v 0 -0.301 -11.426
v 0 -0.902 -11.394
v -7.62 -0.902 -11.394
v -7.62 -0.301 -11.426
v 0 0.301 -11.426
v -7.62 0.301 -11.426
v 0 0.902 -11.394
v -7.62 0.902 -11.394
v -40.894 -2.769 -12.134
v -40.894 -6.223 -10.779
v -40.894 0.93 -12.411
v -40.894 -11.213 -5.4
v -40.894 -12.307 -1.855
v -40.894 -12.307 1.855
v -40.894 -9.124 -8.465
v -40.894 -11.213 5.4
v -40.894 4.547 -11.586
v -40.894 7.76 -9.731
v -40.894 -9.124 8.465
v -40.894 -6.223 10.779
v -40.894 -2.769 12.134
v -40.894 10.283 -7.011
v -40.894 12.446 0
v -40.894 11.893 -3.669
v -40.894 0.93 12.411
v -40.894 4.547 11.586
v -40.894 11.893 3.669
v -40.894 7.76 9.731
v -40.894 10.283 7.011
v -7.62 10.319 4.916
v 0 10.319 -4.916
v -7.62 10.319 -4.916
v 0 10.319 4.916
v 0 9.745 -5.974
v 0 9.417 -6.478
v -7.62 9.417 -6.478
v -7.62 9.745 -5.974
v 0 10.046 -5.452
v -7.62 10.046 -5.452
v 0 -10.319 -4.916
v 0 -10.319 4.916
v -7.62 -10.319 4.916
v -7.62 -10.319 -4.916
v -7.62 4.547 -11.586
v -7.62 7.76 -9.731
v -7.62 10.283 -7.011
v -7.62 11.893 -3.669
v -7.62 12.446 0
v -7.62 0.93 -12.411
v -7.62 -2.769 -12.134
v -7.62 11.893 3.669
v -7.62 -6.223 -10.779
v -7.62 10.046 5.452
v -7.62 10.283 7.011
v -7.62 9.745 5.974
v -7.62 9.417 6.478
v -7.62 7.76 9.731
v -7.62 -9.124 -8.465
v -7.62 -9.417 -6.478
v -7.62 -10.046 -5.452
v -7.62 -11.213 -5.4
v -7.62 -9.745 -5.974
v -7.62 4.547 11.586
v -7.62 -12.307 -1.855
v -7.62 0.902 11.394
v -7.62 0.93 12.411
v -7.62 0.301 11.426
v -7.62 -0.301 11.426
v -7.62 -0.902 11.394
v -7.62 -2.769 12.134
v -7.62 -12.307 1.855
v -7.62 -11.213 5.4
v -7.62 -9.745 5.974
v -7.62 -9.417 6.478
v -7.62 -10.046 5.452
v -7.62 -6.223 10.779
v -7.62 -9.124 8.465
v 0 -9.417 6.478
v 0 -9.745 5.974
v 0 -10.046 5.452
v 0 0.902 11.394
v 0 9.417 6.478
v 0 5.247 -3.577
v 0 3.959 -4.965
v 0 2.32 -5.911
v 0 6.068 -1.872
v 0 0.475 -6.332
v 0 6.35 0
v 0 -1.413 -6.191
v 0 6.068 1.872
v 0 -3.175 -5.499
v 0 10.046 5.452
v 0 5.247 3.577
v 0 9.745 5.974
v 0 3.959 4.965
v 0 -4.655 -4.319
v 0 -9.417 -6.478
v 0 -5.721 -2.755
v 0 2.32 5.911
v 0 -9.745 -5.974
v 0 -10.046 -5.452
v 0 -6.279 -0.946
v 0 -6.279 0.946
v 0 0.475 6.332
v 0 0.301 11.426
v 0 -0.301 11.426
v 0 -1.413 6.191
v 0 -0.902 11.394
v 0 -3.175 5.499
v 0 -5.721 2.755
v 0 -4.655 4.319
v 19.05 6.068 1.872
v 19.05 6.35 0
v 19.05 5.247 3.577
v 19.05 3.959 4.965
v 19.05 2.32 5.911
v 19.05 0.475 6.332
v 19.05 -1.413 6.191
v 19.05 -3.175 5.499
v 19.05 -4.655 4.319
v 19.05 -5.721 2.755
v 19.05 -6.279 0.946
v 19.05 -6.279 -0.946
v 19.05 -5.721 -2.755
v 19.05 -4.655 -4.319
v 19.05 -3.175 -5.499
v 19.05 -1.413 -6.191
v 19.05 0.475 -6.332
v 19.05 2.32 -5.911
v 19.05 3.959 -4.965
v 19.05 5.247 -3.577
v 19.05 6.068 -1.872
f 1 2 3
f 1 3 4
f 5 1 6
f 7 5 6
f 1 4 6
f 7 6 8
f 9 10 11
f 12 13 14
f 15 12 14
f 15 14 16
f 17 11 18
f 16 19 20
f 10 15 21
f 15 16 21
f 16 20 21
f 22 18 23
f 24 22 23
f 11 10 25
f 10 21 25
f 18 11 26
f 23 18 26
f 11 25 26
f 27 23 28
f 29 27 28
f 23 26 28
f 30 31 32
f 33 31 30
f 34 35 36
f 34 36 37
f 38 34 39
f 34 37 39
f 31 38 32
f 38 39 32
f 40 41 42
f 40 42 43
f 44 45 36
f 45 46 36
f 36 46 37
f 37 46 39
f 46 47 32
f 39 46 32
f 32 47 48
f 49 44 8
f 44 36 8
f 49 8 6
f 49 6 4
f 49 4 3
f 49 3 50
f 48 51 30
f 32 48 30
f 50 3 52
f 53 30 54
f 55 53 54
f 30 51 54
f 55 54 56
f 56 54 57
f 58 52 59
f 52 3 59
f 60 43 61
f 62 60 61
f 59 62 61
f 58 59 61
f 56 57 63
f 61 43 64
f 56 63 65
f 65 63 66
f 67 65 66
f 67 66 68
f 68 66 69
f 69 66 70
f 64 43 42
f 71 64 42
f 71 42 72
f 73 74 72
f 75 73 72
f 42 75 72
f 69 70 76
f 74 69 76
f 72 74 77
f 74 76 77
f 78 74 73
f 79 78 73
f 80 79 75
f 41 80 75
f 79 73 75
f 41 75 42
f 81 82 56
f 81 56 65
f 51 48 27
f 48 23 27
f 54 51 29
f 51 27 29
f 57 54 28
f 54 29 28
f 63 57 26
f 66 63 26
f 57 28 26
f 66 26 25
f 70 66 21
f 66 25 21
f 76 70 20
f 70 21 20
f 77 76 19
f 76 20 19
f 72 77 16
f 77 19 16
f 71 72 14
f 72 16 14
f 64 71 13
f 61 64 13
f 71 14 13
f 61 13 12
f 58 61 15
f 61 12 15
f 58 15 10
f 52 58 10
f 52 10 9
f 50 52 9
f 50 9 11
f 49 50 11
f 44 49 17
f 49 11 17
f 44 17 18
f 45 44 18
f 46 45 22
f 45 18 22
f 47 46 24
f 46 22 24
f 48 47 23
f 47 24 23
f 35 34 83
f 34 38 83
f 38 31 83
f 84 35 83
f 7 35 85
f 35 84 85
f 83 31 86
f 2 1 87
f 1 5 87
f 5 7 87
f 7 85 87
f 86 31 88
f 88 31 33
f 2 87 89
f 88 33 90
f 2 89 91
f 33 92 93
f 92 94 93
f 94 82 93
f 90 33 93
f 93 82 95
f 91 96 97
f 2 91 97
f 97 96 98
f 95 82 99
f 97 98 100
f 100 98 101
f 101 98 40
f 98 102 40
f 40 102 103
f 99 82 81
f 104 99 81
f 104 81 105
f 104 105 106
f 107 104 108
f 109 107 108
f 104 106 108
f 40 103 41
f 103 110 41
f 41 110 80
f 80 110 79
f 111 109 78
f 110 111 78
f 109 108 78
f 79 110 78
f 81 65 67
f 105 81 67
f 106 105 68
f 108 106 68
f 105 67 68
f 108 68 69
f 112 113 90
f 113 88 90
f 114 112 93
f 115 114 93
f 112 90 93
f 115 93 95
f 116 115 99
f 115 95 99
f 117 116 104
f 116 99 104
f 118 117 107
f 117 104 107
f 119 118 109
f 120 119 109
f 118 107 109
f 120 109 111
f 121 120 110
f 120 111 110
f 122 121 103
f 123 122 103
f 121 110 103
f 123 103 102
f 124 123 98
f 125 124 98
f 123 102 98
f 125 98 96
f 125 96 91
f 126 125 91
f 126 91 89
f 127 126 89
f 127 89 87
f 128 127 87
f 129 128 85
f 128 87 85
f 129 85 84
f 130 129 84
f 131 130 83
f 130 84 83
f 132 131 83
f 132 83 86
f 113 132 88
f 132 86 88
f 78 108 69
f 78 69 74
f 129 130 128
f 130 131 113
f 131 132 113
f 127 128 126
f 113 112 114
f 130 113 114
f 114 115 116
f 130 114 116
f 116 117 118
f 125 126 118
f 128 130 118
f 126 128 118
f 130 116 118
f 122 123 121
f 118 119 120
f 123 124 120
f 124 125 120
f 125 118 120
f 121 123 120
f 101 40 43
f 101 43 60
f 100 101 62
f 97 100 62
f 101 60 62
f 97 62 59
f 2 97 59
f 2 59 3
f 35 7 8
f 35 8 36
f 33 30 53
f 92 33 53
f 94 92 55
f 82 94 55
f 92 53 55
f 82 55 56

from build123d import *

# Parameters (mm, degrees)
SKETCH3_OUTSIDE_W  = 40.796
SKETCH3_OUTSIDE_H  = 40.796
CUT_EXTRUDE5_DEPTH = 7.62


with BuildPart() as part:
    # Sketch1 → Revolve1 (revolve)
    with BuildSketch(Plane.XY):
        Polygon((0, 11.43), (-7.62, 11.43), (-7.62, 12.446), (-40.894, 12.446), (-40.894, 0), (19.05, 0), (19.05, 6.35), (0, 6.35), align=None)
    revolve(axis=Axis((-40.894, 0, 0), (1, 0, 0)))

    # Sketch3 outside → Cut-Extrude5 (cut)
    with BuildSketch(Plane(origin=(0, 0, 0), x_dir=(0, 0, -1), z_dir=(1, 0, 0))):
        Rectangle(SKETCH3_OUTSIDE_W, SKETCH3_OUTSIDE_H)
        Polygon((5.95753309, 10.31875), (-5.95753309, 10.31875), (-11.91506618, 0), (-5.95753309, -10.31875), (5.95753309, -10.31875), (11.91506618, 0), align=None, mode=Mode.SUBTRACT)
    extrude(amount=-CUT_EXTRUDE5_DEPTH, mode=Mode.SUBTRACT)


solid = part.part
